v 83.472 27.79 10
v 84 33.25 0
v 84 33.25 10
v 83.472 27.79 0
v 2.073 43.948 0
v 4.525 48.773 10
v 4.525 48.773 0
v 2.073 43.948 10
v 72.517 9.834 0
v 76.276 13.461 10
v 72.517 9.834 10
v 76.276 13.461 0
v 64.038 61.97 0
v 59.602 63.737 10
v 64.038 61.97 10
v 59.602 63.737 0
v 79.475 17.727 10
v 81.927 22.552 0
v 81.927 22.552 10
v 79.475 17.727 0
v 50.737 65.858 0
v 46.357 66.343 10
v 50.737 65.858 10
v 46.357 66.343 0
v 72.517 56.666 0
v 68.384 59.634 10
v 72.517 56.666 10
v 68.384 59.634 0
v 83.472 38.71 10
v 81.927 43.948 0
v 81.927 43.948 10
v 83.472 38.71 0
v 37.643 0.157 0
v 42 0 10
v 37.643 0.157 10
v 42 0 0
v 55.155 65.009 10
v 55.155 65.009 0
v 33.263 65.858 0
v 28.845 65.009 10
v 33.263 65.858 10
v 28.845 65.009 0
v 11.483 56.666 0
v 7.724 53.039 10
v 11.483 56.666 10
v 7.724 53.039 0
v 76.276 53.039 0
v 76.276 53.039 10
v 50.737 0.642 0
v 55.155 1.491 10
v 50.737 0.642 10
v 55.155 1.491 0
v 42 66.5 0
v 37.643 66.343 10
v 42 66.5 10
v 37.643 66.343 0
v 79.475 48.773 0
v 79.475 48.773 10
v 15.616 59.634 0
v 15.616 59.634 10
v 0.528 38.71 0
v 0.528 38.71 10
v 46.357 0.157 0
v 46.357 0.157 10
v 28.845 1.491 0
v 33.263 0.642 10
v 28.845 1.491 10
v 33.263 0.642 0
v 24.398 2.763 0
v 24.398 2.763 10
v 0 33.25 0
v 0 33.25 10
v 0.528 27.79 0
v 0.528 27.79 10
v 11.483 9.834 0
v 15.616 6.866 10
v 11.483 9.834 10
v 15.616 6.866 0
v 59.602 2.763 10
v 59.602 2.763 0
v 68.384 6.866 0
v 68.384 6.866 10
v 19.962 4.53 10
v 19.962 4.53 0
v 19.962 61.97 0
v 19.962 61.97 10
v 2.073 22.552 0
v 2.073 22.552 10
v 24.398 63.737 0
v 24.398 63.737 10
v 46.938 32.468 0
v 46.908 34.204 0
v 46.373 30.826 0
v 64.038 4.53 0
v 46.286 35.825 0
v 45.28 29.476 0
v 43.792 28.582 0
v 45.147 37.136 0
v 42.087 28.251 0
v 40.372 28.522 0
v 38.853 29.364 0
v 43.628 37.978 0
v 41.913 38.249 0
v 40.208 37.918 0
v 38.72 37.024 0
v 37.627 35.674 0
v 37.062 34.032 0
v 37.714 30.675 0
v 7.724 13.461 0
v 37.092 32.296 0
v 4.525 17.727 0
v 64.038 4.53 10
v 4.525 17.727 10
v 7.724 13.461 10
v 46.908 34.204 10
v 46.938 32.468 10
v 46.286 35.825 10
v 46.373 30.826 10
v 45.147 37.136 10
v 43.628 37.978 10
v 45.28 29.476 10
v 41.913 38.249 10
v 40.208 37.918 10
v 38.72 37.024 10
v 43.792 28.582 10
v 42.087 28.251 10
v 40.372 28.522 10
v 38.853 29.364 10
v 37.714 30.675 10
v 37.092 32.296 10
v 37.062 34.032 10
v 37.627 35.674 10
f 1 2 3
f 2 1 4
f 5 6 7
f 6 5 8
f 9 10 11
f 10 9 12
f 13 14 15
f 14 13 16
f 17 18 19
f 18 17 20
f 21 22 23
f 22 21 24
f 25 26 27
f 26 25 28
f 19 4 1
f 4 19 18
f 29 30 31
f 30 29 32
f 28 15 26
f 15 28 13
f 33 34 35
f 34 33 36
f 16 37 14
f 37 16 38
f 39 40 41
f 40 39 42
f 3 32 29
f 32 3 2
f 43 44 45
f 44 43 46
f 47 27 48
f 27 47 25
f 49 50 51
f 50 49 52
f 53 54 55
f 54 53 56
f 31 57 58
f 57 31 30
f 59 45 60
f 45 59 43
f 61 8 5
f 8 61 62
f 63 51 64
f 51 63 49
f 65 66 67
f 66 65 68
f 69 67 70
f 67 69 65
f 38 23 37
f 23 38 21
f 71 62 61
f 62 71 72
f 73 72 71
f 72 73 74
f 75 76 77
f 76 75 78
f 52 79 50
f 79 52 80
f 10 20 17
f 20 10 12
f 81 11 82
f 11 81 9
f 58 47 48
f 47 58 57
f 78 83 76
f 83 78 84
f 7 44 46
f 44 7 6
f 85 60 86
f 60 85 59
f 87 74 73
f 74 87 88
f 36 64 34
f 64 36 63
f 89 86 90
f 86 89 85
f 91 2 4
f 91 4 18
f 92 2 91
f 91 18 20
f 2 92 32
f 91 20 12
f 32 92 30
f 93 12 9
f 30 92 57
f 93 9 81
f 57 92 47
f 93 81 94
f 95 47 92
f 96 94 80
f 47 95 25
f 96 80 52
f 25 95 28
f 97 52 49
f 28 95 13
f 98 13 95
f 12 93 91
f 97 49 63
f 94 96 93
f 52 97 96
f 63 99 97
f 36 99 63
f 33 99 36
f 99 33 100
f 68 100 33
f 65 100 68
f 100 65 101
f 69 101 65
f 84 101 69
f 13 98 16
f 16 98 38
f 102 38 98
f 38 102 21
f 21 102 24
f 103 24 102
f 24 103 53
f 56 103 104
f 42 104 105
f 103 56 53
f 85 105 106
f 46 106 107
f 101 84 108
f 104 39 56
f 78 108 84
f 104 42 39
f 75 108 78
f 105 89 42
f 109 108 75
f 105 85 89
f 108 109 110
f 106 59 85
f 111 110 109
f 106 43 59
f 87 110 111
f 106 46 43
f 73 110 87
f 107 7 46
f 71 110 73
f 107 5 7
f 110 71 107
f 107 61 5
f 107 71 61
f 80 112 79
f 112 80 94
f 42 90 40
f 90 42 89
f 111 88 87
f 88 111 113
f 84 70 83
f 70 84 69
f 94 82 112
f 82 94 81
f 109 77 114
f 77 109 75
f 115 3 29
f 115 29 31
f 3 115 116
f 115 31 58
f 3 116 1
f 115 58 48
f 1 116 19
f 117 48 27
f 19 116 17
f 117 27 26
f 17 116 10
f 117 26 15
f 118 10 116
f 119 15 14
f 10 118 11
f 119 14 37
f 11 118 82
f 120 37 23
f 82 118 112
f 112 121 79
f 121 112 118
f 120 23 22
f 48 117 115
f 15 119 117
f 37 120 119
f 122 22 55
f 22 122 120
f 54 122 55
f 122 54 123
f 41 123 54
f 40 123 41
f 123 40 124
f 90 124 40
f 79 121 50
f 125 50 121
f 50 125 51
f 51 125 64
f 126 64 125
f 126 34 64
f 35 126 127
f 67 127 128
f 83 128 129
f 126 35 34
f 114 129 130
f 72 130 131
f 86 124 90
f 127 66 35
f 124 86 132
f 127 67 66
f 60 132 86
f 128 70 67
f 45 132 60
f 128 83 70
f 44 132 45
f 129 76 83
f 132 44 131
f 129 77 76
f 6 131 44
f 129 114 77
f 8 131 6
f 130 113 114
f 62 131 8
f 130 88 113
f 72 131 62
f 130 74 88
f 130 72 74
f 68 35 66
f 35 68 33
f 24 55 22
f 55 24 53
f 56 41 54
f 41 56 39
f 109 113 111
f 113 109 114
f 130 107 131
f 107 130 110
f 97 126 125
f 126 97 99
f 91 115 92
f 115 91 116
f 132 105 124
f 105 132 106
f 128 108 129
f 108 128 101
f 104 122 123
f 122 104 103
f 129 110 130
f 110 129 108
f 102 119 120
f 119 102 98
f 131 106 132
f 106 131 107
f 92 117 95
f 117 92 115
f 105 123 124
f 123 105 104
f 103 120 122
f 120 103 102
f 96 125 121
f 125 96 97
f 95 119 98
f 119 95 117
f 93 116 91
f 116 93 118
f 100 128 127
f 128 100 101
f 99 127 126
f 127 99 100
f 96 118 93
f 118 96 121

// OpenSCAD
$fn = 32;

// ----------------------------------------------------------------------
// Cam plate: double_lobe cam, base R32
// ----------------------------------------------------------------------

// --- parameters (mm) ---
base_r = 32;              // base circle radius
lobe_h = 10;              // cam lobe rise
bore_r = 5;               // shaft bore radius
plate_t = 10;             // plate thickness, Z (extrusion height)

profile = [[84, 33.25], [83.472, 38.71], [81.927, 43.948], [79.475, 48.773], [76.276, 53.039], [72.517, 56.666], [68.384, 59.634], [64.038, 61.97], [59.602, 63.737], [55.155, 65.009], [50.737, 65.858], [46.357, 66.343], [42, 66.5], [37.643, 66.343], [33.263, 65.858], [28.845, 65.009], [24.398, 63.737], [19.962, 61.97], [15.616, 59.634], [11.483, 56.666], [7.724, 53.039], [4.525, 48.773], [2.073, 43.948], [0.528, 38.71], [0, 33.25], [0.528, 27.79], [2.073, 22.552], [4.525, 17.727], [7.724, 13.461], [11.483, 9.834], [15.616, 6.866], [19.962, 4.53], [24.398, 2.763], [28.845, 1.491], [33.263, 0.642], [37.643, 0.157], [42, 0], [46.357, 0.157], [50.737, 0.642], [55.155, 1.491], [59.602, 2.763], [64.038, 4.53], [68.384, 6.866], [72.517, 9.834], [76.276, 13.461], [79.475, 17.727], [81.927, 22.552], [83.472, 27.79]];  // primary outline, 48 points, counter clockwise
void_1 = [[46.908, 34.204], [46.286, 35.825], [45.147, 37.136], [43.628, 37.978], [41.913, 38.249], [40.208, 37.918], [38.72, 37.024], [37.627, 35.674], [37.062, 34.032], [37.092, 32.296], [37.714, 30.675], [38.853, 29.364], [40.372, 28.522], [42.087, 28.251], [43.792, 28.582], [45.28, 29.476], [46.373, 30.826], [46.938, 32.468]];  // shaft bore, 18 points

// --- the one profile operation ---
difference() {
  linear_extrude(height = plate_t) polygon(points = profile);
  translate([0, 0, -1])
    linear_extrude(height = plate_t + 2) polygon(points = void_1);
}
